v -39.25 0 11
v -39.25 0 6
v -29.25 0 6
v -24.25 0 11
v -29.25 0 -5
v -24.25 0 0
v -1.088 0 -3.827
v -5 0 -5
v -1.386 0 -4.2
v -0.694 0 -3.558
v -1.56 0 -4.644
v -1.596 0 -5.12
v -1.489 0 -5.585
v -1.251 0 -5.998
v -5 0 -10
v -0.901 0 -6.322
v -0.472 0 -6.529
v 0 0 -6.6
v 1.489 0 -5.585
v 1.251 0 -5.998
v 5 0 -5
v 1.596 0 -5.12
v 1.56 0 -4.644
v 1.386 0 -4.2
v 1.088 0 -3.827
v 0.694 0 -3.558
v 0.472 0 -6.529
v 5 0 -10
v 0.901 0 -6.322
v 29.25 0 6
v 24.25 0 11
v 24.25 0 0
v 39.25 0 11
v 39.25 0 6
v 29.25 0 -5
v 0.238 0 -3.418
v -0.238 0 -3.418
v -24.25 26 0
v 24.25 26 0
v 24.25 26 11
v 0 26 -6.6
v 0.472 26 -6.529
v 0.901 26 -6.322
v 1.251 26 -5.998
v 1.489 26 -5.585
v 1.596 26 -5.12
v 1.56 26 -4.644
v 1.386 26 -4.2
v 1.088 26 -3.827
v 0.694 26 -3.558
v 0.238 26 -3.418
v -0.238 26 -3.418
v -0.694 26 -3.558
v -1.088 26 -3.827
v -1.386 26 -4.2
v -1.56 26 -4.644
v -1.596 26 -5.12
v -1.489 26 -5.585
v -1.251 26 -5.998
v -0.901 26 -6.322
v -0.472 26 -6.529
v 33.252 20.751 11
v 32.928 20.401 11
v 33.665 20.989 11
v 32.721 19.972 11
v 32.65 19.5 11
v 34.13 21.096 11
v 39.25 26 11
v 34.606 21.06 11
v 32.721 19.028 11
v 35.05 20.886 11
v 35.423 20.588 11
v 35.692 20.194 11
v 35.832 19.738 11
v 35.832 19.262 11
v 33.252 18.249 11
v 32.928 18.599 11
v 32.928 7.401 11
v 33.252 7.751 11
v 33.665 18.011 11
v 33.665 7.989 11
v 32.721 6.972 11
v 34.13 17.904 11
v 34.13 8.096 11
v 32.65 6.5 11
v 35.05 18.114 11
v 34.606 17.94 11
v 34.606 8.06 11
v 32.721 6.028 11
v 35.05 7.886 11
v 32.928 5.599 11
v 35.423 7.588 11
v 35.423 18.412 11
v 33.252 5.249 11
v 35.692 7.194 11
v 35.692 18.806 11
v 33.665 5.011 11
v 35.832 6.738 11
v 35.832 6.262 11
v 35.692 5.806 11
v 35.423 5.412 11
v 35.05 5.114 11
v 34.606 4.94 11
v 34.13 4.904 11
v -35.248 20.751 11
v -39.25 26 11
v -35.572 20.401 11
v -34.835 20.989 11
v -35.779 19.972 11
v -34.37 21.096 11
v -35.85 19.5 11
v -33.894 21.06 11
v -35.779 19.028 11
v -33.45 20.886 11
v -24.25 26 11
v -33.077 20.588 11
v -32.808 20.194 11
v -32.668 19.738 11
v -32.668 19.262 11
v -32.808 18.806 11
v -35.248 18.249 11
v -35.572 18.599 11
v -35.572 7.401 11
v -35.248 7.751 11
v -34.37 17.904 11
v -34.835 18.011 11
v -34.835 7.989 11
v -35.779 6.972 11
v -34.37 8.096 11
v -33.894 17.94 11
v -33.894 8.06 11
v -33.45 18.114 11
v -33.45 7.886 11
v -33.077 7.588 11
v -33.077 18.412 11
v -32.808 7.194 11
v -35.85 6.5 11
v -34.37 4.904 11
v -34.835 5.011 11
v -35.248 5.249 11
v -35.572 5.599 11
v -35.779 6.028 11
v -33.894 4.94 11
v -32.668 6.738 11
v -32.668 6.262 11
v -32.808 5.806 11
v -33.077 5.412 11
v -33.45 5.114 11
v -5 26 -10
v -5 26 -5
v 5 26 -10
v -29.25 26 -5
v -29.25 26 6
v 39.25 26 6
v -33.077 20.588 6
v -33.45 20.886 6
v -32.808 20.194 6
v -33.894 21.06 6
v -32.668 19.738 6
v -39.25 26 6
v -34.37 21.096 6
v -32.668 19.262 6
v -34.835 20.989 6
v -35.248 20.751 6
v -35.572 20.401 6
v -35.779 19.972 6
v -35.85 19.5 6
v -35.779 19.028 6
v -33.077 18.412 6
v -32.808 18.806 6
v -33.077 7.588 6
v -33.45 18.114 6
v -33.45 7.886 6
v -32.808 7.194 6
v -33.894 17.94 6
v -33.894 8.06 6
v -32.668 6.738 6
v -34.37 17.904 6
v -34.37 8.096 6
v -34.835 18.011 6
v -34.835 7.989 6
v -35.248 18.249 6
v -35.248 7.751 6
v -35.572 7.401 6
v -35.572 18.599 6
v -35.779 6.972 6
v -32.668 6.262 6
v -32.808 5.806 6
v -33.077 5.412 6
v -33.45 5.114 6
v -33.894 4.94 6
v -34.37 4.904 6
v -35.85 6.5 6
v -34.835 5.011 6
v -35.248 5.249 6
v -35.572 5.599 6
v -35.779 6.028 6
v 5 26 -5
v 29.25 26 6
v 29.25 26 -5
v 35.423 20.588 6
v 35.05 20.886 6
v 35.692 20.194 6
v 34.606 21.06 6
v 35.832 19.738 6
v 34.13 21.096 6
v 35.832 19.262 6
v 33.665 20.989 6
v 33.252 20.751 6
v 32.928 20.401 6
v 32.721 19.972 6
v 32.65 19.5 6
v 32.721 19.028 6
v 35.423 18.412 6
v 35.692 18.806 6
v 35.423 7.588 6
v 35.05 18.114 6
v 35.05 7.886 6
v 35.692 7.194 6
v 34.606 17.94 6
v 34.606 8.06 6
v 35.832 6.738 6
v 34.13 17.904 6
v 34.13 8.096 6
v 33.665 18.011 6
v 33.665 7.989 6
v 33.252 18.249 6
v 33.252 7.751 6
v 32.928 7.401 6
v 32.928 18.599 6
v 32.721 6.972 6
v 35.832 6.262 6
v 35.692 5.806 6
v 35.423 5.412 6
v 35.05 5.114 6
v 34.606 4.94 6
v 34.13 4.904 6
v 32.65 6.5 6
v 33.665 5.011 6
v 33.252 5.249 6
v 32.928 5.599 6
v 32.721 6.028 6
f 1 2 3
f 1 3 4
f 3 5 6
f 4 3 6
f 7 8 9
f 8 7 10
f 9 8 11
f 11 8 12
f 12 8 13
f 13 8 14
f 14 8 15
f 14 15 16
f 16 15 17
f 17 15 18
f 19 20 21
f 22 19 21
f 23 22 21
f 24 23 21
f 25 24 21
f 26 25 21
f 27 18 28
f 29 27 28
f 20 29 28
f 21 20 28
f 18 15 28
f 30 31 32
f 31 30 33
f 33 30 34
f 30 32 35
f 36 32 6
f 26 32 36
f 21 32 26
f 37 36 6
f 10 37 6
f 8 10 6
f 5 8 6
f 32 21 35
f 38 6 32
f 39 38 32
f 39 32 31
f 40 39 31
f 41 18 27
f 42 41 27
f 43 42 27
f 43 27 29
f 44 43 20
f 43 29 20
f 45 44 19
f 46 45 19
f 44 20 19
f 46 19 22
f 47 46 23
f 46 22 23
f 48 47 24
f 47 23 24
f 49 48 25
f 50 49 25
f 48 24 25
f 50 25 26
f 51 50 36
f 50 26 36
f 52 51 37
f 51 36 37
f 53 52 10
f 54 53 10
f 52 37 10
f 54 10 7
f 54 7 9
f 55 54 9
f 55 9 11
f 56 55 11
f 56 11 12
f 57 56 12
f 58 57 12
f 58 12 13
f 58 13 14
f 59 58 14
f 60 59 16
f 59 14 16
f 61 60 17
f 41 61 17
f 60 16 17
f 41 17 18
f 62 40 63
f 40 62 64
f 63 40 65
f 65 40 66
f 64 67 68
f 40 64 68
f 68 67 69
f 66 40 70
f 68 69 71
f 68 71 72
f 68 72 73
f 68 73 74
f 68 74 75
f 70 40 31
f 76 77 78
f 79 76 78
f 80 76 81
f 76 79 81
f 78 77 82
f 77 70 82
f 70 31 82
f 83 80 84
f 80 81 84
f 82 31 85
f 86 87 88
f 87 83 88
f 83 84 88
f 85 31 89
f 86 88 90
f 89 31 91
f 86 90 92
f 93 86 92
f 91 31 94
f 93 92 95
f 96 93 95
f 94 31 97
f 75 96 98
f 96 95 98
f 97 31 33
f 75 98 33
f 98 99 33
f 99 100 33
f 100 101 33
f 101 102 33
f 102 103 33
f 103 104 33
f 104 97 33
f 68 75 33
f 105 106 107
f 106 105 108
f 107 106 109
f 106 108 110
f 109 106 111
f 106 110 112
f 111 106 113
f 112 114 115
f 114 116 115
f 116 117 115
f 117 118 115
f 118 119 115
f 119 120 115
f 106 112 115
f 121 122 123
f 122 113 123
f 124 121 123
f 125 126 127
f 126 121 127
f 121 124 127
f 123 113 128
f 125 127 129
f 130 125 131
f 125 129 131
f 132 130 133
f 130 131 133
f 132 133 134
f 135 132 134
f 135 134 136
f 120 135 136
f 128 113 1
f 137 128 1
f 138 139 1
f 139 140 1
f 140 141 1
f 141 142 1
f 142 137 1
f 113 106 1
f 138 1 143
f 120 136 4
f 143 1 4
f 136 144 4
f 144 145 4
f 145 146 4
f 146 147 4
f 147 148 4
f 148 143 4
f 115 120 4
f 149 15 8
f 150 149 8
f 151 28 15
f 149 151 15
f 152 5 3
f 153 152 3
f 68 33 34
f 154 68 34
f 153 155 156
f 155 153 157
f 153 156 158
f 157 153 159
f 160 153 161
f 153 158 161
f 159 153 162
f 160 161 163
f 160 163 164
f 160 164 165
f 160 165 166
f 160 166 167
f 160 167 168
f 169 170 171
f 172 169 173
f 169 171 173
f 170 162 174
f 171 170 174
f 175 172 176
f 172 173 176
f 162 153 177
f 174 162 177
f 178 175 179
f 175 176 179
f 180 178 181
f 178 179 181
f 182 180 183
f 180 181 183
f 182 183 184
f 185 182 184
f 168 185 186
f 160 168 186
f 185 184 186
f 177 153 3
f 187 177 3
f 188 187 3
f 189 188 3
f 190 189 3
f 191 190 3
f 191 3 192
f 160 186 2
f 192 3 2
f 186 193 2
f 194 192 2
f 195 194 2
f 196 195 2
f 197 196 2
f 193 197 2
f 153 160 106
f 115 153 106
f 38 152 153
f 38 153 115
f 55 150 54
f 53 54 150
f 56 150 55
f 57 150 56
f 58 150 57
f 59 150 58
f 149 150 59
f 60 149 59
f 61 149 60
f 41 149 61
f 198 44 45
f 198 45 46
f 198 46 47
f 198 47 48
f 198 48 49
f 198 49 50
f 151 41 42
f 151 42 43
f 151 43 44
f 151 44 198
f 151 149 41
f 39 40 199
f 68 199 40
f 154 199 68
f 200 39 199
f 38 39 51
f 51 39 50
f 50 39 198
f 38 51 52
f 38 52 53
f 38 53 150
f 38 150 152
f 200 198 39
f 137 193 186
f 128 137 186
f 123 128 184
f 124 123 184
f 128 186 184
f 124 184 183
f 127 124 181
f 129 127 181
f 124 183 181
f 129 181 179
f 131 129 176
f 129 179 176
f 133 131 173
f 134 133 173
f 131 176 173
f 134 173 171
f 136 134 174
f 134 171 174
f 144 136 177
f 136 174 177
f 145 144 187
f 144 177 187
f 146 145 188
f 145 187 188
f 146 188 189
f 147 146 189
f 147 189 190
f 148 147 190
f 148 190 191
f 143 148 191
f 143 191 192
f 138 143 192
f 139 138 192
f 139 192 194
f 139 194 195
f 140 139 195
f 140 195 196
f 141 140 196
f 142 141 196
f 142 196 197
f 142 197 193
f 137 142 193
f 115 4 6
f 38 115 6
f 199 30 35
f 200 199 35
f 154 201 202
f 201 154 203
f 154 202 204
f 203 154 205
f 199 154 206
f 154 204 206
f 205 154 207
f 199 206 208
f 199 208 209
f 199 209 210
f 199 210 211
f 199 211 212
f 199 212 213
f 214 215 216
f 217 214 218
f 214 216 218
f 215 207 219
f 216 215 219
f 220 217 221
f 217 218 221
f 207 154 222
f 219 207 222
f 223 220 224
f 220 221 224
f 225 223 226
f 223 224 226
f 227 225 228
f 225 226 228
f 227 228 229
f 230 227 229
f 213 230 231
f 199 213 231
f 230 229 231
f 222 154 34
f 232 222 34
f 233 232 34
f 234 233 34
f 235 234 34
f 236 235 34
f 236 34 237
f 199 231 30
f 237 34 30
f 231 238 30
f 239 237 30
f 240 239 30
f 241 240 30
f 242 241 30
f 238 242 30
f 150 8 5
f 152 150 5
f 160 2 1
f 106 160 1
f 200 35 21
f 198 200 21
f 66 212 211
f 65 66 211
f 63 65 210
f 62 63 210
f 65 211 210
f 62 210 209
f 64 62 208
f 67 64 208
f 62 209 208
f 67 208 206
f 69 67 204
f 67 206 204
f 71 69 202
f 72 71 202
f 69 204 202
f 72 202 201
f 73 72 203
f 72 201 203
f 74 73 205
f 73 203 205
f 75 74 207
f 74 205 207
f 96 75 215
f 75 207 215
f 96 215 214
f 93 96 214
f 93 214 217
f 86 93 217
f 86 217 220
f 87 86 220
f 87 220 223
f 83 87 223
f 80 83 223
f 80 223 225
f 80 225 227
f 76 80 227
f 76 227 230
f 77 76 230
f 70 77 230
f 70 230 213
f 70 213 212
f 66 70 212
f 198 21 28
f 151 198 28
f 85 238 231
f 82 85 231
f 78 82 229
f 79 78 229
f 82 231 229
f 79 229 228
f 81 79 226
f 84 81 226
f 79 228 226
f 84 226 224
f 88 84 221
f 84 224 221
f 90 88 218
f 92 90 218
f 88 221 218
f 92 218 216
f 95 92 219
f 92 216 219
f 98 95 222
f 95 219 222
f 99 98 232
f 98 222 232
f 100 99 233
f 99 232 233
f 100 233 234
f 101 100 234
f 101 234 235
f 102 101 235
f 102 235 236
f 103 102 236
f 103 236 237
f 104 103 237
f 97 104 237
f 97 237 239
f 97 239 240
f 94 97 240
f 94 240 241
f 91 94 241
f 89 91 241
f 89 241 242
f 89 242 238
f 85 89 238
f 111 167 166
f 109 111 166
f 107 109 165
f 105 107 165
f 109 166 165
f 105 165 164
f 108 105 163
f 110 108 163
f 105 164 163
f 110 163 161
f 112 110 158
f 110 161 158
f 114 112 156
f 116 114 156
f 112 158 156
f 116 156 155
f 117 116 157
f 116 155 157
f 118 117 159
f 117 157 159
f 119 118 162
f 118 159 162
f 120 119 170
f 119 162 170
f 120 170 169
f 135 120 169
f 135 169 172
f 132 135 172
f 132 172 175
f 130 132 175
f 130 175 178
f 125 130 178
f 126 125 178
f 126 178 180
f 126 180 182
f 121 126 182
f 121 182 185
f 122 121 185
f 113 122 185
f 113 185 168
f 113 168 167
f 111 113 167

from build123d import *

# Parameters (mm, degrees)
BOSS_EXTRUDE2_DEPTH = 26
SKETCH5_R           = 1.6
CUT_EXTRUDE4_DEPTH  = 26
SKETCH6_R           = 1.6
CUT_EXTRUDE6_DEPTH  = 26


with BuildPart() as part:
    # Sketch1 → Boss-Extrude2 (new body)
    with BuildSketch(Plane(origin=(0, 0, 0), x_dir=(1, 0, 0), z_dir=(0, 1, 0))):
        Polygon((-24.25, 0), (24.25, 0), (24.25, -11), (39.25, -11), (39.25, -6), (29.25, -6), (29.25, 5), (5, 5), (5, 10), (-5, 10), (-5, 5), (-29.25, 5), (-29.25, -6), (-39.25, -6), (-39.25, -11), (-24.25, -11), align=None)
    extrude(amount=BOSS_EXTRUDE2_DEPTH)

    # Sketch5 → Cut-Extrude4 (cut)
    with BuildSketch(Plane.XZ):
        with Locations(Location((0, -5, 0), (0, 0, 270))):
            Circle(SKETCH5_R)
    extrude(amount=-CUT_EXTRUDE4_DEPTH, mode=Mode.SUBTRACT)

    # Sketch6 → Cut-Extrude6 (cut)
    with BuildSketch(Plane(origin=(0, 0, 6), x_dir=(-1, 0, 0), z_dir=(0, 0, -1))):
        with Locations((34.25, 19.5)):
            Circle(SKETCH6_R)
        with Locations((34.25, 6.5)):
            Circle(SKETCH6_R)
        with Locations((-34.25, 6.5)):
            Circle(SKETCH6_R)
        with Locations((-34.25, 19.5)):
            Circle(SKETCH6_R)
    extrude(amount=-CUT_EXTRUDE6_DEPTH, mode=Mode.SUBTRACT)


solid = part.part
